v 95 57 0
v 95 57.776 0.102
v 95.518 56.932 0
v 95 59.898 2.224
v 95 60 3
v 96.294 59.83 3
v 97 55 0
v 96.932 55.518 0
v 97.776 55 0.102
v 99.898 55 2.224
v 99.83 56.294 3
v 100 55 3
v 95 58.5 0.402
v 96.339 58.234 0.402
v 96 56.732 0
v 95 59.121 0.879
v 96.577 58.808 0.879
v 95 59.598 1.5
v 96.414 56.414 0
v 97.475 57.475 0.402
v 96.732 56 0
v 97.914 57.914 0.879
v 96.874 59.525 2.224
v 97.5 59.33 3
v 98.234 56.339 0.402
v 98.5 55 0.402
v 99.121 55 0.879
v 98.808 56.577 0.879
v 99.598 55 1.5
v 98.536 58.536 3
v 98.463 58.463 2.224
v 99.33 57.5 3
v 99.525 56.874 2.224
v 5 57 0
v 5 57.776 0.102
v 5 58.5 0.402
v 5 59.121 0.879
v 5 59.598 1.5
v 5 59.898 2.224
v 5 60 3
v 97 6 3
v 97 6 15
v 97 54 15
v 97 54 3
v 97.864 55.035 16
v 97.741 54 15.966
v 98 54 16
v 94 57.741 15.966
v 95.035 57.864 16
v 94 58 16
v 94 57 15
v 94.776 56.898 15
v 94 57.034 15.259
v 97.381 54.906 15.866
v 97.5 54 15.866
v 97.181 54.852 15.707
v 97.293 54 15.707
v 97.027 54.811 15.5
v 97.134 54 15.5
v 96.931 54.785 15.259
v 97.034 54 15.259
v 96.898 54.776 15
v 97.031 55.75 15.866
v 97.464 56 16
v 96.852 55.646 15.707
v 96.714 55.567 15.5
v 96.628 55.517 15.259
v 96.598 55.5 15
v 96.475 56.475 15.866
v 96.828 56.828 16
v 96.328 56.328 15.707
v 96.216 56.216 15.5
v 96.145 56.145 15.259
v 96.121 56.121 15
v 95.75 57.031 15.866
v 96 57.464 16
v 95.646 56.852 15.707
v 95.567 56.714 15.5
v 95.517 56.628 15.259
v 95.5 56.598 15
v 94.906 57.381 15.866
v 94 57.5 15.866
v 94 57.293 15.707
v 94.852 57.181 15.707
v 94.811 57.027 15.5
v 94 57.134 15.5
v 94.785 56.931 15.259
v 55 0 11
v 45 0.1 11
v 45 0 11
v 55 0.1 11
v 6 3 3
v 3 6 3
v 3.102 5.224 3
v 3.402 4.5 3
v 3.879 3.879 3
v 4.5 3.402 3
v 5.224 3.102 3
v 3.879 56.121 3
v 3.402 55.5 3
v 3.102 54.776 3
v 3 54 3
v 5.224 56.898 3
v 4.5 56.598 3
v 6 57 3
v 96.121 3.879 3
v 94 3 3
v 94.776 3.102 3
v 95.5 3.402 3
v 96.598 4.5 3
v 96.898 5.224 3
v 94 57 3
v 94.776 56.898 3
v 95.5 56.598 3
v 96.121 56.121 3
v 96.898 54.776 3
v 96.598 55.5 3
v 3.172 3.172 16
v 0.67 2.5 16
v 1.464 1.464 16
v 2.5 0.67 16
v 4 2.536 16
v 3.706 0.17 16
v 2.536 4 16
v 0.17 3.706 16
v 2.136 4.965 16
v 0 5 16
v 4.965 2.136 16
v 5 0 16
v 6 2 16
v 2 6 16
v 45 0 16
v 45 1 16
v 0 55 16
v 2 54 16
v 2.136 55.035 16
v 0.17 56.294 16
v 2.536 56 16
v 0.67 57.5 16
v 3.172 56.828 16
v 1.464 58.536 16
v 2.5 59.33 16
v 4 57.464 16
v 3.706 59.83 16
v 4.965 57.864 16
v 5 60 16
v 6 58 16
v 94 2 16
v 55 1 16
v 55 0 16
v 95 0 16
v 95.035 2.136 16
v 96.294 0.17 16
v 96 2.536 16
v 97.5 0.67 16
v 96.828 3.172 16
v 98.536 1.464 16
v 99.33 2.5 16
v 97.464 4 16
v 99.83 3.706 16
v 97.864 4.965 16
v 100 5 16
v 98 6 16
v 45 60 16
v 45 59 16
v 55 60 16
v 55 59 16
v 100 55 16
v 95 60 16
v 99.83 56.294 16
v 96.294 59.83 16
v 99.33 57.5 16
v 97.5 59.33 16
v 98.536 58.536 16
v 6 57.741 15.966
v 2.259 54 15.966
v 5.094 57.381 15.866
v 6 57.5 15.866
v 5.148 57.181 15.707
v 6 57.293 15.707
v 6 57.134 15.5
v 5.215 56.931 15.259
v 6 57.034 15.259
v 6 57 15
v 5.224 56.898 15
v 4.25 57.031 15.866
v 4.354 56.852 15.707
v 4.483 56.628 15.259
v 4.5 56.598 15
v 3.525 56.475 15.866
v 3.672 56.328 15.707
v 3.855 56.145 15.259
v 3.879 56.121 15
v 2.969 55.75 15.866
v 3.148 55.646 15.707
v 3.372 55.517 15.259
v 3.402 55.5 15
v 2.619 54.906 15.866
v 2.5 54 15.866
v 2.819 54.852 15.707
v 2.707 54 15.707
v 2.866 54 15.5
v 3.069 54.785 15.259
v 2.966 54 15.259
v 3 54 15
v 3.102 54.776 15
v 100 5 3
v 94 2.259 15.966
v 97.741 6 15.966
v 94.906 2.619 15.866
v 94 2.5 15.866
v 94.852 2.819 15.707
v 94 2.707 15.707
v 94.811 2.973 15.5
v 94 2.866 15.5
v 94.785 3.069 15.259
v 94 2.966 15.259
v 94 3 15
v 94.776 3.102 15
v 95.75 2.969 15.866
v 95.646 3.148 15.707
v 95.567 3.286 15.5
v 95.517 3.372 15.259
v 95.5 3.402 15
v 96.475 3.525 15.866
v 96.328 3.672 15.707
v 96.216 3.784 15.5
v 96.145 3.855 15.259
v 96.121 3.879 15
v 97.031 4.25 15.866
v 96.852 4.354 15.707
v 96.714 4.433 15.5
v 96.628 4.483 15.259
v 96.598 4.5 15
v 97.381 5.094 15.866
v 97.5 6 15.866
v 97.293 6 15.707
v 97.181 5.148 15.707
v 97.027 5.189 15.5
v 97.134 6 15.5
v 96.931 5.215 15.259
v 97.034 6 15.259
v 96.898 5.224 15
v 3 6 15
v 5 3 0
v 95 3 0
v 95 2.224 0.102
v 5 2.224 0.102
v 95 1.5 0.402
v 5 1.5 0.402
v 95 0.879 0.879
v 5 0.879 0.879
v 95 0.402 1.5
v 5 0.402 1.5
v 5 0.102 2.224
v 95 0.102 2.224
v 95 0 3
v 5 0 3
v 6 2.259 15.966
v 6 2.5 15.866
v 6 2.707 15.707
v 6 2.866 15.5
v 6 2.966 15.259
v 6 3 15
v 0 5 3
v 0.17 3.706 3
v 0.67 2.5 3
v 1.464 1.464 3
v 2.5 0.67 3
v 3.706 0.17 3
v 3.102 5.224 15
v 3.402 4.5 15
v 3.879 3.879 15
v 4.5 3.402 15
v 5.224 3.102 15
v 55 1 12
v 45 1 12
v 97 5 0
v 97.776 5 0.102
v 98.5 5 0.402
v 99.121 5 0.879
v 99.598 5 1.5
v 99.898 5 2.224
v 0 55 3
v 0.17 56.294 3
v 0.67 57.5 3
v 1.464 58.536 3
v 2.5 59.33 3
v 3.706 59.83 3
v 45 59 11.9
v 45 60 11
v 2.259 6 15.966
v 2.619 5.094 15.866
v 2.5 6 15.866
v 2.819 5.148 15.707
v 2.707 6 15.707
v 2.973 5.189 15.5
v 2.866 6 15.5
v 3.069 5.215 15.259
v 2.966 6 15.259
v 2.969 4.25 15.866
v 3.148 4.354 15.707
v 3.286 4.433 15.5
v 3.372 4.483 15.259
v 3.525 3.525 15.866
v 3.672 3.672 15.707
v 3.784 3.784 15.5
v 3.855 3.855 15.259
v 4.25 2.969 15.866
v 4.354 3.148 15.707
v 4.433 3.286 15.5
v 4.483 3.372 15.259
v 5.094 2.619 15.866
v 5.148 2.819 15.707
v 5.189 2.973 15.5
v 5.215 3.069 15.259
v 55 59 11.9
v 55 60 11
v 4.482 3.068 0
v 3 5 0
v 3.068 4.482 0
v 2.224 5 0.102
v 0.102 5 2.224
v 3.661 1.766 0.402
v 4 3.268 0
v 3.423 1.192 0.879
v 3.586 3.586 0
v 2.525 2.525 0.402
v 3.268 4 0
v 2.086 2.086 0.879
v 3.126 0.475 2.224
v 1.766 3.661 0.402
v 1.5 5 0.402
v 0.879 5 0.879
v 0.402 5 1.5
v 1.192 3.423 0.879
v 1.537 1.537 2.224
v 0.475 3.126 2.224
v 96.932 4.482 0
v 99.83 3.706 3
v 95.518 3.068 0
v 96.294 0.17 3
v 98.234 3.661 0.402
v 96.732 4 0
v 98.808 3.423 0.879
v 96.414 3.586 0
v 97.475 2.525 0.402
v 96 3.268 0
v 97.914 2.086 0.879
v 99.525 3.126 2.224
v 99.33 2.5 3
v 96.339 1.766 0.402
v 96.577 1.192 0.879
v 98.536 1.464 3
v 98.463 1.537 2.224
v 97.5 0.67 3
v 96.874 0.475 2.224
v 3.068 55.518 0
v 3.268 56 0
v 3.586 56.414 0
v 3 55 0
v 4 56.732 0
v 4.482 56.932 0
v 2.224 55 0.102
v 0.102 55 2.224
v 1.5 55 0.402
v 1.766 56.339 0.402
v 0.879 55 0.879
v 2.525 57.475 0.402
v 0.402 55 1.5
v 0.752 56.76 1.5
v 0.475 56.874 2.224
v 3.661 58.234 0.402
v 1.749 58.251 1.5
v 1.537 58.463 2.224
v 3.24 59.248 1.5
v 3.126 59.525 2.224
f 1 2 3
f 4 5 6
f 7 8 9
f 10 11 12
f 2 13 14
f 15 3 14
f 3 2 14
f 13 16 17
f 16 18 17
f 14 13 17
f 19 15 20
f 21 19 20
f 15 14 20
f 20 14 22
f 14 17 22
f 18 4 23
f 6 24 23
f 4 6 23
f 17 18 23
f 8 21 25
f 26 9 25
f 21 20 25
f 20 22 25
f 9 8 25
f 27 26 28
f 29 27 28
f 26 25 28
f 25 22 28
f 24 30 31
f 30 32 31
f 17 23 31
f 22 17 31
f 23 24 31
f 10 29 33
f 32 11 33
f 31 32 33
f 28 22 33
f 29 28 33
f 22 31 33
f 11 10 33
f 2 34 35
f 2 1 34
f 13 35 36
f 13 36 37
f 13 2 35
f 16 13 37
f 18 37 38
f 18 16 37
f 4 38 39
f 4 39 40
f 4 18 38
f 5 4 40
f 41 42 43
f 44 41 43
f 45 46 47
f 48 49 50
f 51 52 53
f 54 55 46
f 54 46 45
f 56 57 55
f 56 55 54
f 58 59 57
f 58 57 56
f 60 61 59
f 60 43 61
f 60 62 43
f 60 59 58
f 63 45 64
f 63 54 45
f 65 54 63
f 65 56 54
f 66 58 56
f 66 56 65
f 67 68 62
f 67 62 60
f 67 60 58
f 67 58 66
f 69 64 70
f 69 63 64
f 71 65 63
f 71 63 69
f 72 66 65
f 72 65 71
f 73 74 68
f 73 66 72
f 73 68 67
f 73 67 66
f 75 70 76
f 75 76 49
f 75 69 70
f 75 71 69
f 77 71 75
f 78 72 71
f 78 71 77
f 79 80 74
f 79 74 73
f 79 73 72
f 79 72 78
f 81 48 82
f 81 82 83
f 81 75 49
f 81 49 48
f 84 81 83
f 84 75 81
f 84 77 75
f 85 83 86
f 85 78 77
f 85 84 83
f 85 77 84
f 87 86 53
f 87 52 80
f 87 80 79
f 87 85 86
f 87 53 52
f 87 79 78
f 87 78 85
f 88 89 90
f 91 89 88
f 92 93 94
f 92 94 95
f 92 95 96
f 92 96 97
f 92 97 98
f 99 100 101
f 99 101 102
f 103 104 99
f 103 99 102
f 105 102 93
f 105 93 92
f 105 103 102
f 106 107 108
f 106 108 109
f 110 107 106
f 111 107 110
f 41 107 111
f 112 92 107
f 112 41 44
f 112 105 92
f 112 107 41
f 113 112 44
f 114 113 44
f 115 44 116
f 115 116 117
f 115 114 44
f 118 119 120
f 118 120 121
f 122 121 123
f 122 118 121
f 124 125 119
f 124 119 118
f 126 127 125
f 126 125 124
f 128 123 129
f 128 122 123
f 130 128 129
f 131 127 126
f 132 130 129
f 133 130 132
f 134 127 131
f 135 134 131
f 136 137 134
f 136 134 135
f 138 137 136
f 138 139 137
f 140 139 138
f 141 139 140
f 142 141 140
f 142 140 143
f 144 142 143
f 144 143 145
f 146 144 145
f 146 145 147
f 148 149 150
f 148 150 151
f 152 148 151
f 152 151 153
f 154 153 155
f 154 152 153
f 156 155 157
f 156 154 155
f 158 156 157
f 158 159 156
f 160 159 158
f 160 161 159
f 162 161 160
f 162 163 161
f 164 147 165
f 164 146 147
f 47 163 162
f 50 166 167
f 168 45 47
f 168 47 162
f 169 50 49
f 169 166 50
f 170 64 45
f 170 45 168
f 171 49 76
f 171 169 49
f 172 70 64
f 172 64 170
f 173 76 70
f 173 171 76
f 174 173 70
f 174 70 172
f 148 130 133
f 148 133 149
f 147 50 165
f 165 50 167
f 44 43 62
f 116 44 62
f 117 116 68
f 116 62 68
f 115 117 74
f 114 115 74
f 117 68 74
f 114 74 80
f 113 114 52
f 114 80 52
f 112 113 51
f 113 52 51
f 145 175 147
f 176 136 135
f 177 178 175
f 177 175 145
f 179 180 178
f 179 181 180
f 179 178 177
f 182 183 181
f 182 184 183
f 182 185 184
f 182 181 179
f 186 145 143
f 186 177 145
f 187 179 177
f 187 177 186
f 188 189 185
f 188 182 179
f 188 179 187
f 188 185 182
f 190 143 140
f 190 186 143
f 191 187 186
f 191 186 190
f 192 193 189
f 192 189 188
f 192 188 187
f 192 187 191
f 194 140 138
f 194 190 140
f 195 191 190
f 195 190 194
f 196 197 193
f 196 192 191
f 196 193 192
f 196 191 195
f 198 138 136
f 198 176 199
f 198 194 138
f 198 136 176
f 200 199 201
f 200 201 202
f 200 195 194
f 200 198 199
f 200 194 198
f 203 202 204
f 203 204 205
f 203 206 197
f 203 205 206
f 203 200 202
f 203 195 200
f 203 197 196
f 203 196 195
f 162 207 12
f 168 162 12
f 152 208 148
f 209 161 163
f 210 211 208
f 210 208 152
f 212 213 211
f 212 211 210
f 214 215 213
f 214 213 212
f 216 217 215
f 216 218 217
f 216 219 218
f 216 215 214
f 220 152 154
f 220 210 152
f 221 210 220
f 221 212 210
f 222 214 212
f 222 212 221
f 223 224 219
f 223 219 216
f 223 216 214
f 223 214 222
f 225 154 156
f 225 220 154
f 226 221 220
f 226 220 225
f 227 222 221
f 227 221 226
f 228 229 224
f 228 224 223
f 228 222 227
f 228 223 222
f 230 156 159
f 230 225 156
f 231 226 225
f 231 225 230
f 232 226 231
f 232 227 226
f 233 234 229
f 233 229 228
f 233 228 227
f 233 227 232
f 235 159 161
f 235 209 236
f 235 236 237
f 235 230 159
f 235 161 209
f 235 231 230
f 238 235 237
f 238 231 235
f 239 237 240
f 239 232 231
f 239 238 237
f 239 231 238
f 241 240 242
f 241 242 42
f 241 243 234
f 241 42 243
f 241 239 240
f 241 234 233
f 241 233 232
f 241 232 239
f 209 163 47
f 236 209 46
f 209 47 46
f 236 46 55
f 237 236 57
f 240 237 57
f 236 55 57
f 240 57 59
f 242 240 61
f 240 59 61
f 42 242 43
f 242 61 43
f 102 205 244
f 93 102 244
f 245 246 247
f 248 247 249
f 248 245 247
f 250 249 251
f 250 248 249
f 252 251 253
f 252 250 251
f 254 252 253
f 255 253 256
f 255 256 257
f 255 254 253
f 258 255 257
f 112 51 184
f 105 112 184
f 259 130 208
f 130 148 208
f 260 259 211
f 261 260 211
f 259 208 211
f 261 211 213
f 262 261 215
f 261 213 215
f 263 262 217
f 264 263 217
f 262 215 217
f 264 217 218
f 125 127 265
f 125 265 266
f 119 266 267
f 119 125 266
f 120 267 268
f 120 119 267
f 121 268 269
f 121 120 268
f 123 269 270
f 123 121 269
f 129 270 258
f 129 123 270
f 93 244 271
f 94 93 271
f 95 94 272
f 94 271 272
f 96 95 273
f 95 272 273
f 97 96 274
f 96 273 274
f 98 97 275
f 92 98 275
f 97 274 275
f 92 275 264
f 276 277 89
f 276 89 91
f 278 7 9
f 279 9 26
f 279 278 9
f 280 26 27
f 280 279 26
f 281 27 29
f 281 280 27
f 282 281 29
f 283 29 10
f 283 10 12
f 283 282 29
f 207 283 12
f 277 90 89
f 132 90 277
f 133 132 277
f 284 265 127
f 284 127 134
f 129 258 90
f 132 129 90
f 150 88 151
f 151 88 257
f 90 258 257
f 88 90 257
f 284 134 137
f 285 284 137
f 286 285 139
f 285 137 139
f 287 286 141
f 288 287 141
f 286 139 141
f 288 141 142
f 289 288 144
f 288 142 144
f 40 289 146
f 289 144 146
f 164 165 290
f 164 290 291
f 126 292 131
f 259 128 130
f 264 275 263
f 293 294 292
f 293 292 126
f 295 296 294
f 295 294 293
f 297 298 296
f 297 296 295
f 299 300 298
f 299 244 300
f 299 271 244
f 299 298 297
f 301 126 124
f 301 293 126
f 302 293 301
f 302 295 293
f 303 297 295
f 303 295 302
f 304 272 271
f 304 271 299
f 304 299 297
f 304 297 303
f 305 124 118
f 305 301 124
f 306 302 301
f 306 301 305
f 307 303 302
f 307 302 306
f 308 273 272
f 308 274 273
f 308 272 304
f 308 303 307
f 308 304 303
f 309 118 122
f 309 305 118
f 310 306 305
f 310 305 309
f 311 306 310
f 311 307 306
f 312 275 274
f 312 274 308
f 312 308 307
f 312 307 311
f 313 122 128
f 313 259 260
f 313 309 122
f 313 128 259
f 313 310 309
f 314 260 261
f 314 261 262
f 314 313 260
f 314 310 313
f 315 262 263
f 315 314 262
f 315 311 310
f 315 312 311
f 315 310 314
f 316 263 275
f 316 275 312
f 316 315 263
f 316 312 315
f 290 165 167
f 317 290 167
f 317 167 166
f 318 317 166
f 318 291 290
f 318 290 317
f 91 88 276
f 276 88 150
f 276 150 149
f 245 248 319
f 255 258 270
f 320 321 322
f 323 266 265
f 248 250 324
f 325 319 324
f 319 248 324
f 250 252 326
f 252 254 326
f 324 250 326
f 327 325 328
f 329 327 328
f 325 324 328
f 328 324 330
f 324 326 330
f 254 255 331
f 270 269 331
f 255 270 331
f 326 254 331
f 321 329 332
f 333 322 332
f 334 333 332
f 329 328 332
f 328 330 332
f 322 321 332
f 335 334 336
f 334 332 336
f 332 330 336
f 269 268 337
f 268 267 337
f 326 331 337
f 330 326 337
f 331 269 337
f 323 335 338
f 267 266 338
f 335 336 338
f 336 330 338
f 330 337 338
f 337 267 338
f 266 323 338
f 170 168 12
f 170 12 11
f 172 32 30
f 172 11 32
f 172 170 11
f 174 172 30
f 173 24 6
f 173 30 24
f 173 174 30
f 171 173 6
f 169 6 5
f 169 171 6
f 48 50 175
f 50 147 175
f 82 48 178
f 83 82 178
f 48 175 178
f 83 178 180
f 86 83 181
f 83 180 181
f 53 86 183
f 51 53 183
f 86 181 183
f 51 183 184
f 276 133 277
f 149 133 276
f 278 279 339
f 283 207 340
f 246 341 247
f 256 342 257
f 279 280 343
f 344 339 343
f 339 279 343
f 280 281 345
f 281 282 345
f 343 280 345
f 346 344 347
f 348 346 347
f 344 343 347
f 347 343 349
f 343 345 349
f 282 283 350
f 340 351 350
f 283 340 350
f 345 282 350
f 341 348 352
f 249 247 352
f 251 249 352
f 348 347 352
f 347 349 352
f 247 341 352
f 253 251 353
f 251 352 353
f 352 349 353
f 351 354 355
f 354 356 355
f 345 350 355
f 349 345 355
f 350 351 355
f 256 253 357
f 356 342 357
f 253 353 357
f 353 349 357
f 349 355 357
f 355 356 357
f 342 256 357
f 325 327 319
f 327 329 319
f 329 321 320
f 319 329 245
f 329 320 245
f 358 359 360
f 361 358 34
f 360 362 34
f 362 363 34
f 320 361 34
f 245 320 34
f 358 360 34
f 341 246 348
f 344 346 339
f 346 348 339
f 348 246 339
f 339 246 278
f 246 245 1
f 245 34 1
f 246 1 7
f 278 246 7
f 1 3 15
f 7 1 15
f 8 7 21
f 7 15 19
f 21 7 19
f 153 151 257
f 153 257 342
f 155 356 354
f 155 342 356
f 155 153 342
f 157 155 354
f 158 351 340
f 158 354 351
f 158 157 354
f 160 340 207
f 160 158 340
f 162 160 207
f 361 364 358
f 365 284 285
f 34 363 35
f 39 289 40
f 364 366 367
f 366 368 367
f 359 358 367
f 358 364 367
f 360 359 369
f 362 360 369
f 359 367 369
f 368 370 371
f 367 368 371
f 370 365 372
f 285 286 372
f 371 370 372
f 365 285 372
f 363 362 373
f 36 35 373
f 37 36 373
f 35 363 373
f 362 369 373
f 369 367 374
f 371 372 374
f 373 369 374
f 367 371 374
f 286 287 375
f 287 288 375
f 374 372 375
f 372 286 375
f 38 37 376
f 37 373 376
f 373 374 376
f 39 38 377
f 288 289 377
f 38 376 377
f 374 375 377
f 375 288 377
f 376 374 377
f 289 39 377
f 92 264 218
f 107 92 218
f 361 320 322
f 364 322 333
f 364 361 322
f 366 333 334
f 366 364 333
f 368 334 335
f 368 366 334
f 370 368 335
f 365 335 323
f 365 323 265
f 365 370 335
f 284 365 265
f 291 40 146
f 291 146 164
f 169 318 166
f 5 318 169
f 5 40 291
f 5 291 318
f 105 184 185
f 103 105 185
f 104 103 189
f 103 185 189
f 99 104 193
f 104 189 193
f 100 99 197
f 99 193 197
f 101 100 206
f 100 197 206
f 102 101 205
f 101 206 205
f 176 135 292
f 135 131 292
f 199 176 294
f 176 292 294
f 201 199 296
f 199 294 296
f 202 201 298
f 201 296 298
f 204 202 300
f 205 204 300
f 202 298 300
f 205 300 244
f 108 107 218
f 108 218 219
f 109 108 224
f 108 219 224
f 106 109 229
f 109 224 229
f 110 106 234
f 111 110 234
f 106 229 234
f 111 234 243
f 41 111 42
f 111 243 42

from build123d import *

# Parameters (mm, degrees)
SKETCH_W        = 100
SKETCH_H        = 60
PAD_DEPTH       = 16
FILLET_R        = 5
FILLET001_R     = 3
POCKET_DEPTH    = 13
SKETCH002_W     = 10
SKETCH002_H     = 1
POCKET001_DEPTH = 5
CHAMFER_1_ANGLE = 48
CHAMFER_1_SIZE  = 0.9
CHAMFER_2_ANGLE = 48
CHAMFER_2_SIZE  = 0.9
FILLET002_R     = 1


with BuildPart() as part:
    # Sketch → Pad (new body)
    with BuildSketch(Plane.XY):
        with Locations((50, 30)):
            Rectangle(SKETCH_W, SKETCH_H)
    extrude(amount=PAD_DEPTH)

    # Fillet
    fillet_edges = [part.edges().sort_by_distance(p)[0] for p in [
        (100, 0, 8),
        (100, 60, 8),
        (0, 60, 8),
        (0, 0, 8),
    ]]
    fillet(fillet_edges, radius=FILLET_R)

    # Fillet001
    fillet001_edges = [part.edges().sort_by_distance(p)[0] for p in [
        (50, 60, 0),
    ]]
    fillet(fillet001_edges, radius=FILLET001_R)

    # Sketch001 (on Face6 of Pad) → Pocket (cut)
    with BuildSketch(Plane.XY.offset(16)):
        with BuildLine():
            Line((6, 3), (94, 3))
            ThreePointArc((94, 3), (96.12132, 3.87868), (97, 6))
            Line((97, 6), (97, 54))
            ThreePointArc((97, 54), (96.12132, 56.12132), (94, 57))
            Line((94, 57), (6, 57))
            ThreePointArc((6, 57), (3.87868, 56.12132), (3, 54))
            Line((3, 54), (3, 6))
            ThreePointArc((3, 6), (3.87868, 3.87868), (6, 3))
        make_face()
    extrude(amount=-POCKET_DEPTH, mode=Mode.SUBTRACT)

    # Sketch002 (on Face4 of Pocket) → Pocket001 (cut)
    with BuildSketch(Plane.XY.offset(16)):
        with Locations((50, 0.5)):
            Rectangle(SKETCH002_W, SKETCH002_H)
        with Locations((50, 59.5)):
            Rectangle(SKETCH002_W, SKETCH002_H)
    extrude(amount=-POCKET001_DEPTH, mode=Mode.SUBTRACT)

    # Chamfer 1
    chamfer_1_edges = [part.edges().sort_by_distance(p)[0] for p in [
        (50, 59, 11),
    ]]
    chamfer_1_side = part.faces().sort_by_distance((50, 59, 13.5))[0]
    chamfer(chamfer_1_edges, length=CHAMFER_1_SIZE, angle=CHAMFER_1_ANGLE, reference=chamfer_1_side)

    # Chamfer 2
    chamfer_2_edges = [part.edges().sort_by_distance(p)[0] for p in [
        (50, 1, 11),
    ]]
    chamfer_2_side = part.faces().sort_by_distance((50, 0.5, 11))[0]
    chamfer(chamfer_2_edges, length=CHAMFER_2_SIZE, angle=CHAMFER_2_ANGLE, reference=chamfer_2_side)

    # Fillet002
    fillet002_edges = [part.edges().sort_by_distance(p)[0] for p in [
        (3, 30, 16),
    ]]
    fillet(fillet002_edges, radius=FILLET002_R)


solid = part.part
